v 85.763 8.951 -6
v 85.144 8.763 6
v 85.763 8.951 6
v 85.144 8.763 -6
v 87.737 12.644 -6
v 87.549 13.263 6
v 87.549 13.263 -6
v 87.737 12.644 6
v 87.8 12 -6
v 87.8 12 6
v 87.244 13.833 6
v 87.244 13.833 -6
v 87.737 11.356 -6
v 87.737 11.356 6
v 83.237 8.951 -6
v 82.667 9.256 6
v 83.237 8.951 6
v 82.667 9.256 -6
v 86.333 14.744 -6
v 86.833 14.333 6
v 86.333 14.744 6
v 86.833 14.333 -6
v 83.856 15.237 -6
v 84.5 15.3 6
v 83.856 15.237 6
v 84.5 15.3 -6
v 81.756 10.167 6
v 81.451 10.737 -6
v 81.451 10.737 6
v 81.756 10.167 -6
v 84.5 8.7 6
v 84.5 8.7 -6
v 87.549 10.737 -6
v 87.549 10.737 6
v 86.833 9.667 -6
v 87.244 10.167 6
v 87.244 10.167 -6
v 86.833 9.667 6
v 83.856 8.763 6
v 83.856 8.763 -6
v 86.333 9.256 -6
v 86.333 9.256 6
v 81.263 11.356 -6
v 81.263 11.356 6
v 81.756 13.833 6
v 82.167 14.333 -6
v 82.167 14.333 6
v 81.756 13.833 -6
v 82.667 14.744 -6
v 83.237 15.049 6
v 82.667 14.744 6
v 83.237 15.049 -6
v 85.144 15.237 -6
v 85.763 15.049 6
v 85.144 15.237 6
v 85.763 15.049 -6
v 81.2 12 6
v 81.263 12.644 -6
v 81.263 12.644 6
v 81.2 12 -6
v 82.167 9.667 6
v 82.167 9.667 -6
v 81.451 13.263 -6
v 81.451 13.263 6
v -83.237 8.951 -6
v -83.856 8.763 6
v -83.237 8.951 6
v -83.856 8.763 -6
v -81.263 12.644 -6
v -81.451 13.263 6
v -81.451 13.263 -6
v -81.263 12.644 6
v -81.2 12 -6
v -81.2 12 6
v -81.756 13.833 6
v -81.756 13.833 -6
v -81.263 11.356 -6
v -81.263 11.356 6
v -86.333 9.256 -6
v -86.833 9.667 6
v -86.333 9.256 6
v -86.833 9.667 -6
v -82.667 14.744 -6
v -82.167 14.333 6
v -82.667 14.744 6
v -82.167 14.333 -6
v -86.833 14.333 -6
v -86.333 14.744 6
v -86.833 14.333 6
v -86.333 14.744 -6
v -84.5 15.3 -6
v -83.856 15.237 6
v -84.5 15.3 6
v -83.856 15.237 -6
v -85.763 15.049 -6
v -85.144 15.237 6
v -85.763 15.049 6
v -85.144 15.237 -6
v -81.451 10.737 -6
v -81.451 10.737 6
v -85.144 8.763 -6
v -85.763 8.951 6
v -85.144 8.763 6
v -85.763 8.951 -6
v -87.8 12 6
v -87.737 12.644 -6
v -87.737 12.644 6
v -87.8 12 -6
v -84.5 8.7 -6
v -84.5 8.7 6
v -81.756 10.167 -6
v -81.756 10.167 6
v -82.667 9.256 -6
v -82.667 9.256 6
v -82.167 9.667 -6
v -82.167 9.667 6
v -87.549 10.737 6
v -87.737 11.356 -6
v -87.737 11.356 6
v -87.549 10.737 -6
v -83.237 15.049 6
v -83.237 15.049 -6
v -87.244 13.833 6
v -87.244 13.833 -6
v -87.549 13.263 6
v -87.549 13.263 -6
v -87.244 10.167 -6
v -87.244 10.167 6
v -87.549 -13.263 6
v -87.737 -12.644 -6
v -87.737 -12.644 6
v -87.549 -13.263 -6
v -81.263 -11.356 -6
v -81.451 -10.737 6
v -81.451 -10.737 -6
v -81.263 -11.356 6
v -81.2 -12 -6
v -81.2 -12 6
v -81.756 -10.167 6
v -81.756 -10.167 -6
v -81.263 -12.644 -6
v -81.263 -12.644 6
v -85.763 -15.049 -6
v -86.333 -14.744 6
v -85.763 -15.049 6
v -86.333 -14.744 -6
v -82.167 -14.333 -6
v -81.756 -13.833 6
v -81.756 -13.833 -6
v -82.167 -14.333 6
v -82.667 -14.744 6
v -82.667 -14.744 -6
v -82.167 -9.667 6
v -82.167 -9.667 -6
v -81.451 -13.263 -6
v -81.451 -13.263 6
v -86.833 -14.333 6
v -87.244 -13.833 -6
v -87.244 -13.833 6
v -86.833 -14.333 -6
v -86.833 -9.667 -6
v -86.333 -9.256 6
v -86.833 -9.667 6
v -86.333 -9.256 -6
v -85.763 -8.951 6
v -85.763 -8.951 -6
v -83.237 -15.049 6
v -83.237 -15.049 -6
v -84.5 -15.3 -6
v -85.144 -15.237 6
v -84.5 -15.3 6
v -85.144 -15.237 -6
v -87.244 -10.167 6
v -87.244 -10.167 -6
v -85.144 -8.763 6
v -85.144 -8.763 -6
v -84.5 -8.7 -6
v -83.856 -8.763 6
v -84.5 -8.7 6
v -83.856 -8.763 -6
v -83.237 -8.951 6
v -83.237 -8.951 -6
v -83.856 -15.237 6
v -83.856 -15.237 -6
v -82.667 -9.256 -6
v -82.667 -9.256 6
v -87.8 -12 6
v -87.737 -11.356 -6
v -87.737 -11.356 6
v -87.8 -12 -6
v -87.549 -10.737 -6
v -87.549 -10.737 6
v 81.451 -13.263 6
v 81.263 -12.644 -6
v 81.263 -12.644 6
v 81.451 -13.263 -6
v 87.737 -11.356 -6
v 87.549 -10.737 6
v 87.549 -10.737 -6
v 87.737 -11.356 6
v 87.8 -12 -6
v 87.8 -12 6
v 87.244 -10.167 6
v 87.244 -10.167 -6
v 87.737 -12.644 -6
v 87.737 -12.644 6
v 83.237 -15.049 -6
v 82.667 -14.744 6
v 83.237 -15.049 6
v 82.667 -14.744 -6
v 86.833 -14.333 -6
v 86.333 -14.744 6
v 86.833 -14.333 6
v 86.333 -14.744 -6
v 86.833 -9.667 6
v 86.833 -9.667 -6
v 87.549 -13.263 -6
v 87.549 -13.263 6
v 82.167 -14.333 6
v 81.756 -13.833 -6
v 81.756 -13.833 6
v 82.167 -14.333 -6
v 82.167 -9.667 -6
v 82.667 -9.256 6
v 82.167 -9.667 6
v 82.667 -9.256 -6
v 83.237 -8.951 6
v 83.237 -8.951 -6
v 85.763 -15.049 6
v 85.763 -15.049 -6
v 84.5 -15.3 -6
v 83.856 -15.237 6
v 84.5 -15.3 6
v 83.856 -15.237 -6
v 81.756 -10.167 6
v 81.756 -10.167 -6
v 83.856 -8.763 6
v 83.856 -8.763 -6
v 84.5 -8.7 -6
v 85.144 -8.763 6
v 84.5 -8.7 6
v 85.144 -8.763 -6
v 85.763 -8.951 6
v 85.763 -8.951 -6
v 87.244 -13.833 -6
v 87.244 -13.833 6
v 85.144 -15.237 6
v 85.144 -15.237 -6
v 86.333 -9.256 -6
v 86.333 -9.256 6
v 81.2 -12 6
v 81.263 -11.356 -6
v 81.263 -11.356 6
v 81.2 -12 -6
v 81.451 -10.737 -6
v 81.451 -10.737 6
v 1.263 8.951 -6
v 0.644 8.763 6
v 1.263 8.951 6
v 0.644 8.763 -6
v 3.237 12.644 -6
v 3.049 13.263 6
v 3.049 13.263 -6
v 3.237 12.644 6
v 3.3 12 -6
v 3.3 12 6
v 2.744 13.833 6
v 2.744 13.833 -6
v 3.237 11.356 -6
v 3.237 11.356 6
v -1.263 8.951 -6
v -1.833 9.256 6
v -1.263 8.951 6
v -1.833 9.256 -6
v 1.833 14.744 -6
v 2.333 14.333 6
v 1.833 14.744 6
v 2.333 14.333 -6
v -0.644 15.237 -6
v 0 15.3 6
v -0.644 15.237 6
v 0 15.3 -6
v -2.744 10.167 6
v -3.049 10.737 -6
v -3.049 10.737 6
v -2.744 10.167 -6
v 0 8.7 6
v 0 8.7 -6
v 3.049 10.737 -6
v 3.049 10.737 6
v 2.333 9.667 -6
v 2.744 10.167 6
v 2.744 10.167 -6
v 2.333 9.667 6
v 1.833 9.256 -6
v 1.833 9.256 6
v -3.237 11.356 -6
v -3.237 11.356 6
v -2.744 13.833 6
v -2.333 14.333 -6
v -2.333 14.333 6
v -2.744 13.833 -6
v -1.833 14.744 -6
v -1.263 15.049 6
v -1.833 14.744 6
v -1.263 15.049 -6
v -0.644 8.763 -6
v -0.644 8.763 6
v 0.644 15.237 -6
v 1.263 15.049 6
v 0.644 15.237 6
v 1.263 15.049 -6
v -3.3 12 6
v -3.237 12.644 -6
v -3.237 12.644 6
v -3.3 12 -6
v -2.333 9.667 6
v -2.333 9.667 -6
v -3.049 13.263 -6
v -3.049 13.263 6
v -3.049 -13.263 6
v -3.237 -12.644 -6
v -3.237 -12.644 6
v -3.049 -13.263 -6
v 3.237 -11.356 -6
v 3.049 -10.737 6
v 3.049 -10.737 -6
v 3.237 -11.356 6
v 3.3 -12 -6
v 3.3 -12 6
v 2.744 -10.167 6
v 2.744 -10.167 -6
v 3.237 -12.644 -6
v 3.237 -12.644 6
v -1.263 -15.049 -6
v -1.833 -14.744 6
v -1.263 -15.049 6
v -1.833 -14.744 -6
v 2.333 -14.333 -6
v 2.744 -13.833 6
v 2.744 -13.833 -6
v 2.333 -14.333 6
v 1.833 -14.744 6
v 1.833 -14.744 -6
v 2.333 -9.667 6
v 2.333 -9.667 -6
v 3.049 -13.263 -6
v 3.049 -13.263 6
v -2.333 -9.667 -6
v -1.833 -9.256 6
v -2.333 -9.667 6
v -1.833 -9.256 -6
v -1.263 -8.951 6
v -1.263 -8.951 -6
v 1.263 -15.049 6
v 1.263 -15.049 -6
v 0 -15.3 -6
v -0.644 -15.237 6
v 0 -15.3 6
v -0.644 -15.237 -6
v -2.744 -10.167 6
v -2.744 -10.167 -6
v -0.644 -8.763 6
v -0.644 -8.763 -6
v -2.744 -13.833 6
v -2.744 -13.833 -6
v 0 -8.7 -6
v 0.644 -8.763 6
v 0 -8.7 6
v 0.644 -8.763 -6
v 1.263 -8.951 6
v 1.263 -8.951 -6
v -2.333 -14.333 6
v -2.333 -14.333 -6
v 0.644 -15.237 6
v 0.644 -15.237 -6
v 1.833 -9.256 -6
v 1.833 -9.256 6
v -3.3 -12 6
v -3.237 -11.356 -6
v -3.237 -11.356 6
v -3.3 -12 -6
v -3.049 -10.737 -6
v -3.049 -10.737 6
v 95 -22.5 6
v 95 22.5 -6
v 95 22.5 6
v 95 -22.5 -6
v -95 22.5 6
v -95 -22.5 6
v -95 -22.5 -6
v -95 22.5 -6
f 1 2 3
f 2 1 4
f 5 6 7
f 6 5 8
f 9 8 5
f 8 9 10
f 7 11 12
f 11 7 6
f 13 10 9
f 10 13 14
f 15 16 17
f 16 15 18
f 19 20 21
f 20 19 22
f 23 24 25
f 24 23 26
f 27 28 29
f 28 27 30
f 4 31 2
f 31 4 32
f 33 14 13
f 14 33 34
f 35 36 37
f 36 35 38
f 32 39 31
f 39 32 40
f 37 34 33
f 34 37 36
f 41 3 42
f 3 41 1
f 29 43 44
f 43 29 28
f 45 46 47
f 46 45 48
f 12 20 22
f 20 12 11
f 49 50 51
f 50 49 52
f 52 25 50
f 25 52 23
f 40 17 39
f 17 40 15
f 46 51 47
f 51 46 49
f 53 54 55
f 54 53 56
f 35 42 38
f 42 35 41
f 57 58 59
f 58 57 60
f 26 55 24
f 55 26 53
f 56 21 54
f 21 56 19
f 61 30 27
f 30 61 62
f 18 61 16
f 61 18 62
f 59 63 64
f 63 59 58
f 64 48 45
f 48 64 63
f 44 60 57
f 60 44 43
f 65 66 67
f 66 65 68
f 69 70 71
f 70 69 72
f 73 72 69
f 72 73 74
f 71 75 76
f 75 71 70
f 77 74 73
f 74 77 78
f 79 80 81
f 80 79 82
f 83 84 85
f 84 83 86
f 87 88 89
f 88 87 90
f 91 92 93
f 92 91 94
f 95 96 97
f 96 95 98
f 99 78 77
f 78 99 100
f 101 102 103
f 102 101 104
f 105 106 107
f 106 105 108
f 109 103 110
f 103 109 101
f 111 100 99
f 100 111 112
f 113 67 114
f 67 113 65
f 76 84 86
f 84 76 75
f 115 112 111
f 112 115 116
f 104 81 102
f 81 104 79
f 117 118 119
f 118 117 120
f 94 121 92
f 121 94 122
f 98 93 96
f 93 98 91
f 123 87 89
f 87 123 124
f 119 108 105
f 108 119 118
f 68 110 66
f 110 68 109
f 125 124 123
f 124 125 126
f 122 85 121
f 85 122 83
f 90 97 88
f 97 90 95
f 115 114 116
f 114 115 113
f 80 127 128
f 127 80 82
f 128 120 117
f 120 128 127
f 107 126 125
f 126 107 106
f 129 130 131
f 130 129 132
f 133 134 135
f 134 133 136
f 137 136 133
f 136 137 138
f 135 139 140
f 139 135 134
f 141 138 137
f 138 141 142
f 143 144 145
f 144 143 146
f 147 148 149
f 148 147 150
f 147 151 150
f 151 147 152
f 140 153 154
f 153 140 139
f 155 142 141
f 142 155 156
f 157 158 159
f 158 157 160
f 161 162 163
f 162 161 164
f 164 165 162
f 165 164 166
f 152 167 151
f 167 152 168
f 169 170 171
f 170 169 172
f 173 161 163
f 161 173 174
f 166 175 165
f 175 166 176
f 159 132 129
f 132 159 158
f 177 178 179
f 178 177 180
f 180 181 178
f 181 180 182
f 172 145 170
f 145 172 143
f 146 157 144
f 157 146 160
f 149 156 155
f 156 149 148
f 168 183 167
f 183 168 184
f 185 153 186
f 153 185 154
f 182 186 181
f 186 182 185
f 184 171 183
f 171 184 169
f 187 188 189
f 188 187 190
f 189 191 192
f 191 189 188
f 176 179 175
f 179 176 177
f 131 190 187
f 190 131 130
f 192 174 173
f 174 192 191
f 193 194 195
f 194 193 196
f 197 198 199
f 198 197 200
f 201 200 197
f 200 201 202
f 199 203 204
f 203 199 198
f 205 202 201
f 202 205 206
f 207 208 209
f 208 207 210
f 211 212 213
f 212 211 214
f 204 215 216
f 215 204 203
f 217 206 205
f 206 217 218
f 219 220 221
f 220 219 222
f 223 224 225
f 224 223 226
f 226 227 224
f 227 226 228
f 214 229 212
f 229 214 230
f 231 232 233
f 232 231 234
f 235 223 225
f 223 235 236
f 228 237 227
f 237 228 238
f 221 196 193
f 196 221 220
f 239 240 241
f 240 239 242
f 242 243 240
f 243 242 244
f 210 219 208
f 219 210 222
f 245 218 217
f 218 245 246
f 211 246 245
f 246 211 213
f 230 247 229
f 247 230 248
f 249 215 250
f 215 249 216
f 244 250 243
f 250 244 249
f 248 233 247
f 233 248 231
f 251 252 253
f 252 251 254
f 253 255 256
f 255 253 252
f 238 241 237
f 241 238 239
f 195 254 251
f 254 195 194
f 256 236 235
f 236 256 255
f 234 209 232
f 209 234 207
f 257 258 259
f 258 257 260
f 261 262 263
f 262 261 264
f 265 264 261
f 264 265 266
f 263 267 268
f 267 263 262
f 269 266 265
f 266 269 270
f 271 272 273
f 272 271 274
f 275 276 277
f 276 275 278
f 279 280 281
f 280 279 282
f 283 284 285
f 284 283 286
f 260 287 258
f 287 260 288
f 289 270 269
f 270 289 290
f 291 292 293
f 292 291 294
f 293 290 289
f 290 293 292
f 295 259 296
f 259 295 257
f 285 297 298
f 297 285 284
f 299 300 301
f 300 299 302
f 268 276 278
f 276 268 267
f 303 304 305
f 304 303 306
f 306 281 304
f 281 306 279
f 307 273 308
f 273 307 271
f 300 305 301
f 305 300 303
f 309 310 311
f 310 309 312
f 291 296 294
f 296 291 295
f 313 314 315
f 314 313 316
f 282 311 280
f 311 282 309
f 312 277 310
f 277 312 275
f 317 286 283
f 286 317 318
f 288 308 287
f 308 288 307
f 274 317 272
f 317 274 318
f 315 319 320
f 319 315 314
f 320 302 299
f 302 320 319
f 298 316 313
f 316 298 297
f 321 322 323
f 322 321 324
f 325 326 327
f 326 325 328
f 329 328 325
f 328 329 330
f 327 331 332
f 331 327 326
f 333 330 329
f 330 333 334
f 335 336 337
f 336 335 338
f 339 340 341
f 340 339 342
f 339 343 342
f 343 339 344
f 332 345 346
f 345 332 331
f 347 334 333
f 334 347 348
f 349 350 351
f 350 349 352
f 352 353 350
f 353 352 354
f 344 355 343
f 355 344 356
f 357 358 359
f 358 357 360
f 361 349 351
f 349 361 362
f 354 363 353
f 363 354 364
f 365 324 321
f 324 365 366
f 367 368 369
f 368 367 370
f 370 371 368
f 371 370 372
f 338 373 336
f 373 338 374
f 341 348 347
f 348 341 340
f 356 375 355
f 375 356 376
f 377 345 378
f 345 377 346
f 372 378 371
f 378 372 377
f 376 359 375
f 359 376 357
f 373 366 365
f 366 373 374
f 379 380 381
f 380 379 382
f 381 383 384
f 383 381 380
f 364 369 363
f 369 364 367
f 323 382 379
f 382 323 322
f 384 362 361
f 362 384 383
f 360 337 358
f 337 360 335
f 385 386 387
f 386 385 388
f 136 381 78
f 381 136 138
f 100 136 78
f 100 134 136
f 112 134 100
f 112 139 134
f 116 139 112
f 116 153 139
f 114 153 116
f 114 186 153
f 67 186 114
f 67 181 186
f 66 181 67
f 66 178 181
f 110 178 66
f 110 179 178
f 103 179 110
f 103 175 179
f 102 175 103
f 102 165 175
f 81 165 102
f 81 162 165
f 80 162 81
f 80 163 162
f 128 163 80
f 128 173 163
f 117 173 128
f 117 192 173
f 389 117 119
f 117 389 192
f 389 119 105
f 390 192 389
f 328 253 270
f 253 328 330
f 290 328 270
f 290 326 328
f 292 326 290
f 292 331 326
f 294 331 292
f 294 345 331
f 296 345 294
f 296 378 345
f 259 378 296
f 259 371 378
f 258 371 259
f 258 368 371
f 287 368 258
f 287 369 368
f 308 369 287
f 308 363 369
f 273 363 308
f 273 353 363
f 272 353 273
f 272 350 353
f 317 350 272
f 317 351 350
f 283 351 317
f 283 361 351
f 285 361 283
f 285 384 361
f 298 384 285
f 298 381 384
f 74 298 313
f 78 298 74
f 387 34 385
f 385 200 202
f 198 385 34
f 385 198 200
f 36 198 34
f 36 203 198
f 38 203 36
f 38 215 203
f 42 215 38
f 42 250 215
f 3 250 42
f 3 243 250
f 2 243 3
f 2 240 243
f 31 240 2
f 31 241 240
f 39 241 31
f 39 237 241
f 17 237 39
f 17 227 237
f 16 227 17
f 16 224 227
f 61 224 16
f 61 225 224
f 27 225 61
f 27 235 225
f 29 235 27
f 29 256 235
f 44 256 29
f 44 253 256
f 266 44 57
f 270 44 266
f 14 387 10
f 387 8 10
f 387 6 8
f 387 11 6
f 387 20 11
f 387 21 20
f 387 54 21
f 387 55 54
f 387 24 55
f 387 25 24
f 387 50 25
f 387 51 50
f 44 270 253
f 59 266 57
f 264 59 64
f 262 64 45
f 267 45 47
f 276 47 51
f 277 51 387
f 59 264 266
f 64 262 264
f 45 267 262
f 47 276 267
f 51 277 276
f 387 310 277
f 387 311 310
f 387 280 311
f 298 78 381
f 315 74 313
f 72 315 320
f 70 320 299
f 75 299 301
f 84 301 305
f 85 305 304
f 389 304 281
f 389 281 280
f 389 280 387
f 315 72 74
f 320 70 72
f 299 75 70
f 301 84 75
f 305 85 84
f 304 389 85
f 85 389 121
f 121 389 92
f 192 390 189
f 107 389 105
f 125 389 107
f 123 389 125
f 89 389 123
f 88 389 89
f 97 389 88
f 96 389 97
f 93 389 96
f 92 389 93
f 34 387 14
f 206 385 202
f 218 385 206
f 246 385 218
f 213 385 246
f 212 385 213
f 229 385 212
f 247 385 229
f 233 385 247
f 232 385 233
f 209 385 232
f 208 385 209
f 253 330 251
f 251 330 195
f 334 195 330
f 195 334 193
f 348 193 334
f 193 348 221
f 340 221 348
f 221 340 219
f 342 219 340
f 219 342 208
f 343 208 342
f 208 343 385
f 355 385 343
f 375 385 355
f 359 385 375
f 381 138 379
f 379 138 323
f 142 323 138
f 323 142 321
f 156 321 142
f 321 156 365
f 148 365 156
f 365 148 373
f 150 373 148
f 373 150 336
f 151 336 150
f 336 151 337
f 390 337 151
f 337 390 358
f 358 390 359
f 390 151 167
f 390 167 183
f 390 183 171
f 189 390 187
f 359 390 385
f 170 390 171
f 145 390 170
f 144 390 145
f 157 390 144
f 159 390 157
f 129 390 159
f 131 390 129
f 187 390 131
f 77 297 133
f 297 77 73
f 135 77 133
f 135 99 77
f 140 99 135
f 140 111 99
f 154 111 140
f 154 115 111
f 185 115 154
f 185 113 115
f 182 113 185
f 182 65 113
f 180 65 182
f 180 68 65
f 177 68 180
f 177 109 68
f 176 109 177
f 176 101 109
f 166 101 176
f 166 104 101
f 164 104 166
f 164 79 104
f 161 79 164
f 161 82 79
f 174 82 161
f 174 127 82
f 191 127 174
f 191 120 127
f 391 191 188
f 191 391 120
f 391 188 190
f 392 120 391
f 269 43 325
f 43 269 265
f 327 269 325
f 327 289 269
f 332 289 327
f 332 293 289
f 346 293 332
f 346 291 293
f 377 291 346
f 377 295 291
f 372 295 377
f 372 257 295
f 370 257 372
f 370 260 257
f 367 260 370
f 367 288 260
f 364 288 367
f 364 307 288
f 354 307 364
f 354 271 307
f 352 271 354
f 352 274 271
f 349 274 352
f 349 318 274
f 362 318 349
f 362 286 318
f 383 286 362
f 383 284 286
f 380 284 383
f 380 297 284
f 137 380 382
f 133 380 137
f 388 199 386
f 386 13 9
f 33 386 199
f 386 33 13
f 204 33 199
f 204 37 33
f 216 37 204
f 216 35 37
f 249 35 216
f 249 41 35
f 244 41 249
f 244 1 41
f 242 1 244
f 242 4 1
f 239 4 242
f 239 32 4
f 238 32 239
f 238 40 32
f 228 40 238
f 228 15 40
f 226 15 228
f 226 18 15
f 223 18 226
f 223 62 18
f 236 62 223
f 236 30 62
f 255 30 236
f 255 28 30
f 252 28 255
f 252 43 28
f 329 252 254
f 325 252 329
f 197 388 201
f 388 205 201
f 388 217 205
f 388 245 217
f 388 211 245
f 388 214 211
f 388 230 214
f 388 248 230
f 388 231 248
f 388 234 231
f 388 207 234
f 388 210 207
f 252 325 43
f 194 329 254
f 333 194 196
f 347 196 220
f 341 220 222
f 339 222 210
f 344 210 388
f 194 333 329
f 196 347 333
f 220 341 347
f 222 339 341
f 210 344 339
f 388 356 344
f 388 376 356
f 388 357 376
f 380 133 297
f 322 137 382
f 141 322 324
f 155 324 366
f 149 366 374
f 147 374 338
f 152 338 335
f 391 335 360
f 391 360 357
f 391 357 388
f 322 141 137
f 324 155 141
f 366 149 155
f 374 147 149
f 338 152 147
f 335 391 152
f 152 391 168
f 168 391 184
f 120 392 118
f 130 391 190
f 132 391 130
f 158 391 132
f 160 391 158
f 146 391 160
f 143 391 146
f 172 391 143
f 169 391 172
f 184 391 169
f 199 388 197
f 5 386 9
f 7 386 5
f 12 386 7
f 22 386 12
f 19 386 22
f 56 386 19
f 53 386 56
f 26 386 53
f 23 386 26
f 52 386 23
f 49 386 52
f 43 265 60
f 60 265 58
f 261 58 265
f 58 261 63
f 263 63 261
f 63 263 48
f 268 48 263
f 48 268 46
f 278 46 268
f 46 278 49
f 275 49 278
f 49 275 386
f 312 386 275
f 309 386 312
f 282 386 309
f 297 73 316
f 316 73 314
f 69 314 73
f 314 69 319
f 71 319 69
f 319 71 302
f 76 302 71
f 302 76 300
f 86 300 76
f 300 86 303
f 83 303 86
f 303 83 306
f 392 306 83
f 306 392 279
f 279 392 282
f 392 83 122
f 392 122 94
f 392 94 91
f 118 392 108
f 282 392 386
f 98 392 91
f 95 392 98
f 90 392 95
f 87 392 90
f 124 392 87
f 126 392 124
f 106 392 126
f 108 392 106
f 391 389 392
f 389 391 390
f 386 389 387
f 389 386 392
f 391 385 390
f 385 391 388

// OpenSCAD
$fn = 32;

// ----------------------------------------------------------------------
// Corner plate 190 x 45 x 12
// 6 holes, centres taken from the edge offset
// ----------------------------------------------------------------------

// --- parameters (mm) ---
plate = [190, 45, 12];  // overall size (x, y, z)
holes = 6;              // number of holes the drawing asks for
hole_d = 6.6;           // hole diameter
edge = 10.5;            // hole centre offset from the plate edge

// --- derived feature positions (mm) ---
corner_x = plate[0] / 2 - edge;  // = 84.5   corner hole X
corner_y = plate[1] / 2 - edge;  // = 12   corner hole Y
feature_centers = [
  [corner_x, corner_y],
  [-corner_x, corner_y],
  [-corner_x, -corner_y],
  [corner_x, -corner_y],
  [0, corner_y],
  [0, -corner_y]
];   // hole centres the loop below drills

// plate outline, every hole drilled through with the same cutters
difference() {
  cube(plate, center = true);
  for (centre = feature_centers)
    translate([centre[0], centre[1], 0])
      cylinder(d = hole_d, h = plate[2] + 2, center = true);
}
